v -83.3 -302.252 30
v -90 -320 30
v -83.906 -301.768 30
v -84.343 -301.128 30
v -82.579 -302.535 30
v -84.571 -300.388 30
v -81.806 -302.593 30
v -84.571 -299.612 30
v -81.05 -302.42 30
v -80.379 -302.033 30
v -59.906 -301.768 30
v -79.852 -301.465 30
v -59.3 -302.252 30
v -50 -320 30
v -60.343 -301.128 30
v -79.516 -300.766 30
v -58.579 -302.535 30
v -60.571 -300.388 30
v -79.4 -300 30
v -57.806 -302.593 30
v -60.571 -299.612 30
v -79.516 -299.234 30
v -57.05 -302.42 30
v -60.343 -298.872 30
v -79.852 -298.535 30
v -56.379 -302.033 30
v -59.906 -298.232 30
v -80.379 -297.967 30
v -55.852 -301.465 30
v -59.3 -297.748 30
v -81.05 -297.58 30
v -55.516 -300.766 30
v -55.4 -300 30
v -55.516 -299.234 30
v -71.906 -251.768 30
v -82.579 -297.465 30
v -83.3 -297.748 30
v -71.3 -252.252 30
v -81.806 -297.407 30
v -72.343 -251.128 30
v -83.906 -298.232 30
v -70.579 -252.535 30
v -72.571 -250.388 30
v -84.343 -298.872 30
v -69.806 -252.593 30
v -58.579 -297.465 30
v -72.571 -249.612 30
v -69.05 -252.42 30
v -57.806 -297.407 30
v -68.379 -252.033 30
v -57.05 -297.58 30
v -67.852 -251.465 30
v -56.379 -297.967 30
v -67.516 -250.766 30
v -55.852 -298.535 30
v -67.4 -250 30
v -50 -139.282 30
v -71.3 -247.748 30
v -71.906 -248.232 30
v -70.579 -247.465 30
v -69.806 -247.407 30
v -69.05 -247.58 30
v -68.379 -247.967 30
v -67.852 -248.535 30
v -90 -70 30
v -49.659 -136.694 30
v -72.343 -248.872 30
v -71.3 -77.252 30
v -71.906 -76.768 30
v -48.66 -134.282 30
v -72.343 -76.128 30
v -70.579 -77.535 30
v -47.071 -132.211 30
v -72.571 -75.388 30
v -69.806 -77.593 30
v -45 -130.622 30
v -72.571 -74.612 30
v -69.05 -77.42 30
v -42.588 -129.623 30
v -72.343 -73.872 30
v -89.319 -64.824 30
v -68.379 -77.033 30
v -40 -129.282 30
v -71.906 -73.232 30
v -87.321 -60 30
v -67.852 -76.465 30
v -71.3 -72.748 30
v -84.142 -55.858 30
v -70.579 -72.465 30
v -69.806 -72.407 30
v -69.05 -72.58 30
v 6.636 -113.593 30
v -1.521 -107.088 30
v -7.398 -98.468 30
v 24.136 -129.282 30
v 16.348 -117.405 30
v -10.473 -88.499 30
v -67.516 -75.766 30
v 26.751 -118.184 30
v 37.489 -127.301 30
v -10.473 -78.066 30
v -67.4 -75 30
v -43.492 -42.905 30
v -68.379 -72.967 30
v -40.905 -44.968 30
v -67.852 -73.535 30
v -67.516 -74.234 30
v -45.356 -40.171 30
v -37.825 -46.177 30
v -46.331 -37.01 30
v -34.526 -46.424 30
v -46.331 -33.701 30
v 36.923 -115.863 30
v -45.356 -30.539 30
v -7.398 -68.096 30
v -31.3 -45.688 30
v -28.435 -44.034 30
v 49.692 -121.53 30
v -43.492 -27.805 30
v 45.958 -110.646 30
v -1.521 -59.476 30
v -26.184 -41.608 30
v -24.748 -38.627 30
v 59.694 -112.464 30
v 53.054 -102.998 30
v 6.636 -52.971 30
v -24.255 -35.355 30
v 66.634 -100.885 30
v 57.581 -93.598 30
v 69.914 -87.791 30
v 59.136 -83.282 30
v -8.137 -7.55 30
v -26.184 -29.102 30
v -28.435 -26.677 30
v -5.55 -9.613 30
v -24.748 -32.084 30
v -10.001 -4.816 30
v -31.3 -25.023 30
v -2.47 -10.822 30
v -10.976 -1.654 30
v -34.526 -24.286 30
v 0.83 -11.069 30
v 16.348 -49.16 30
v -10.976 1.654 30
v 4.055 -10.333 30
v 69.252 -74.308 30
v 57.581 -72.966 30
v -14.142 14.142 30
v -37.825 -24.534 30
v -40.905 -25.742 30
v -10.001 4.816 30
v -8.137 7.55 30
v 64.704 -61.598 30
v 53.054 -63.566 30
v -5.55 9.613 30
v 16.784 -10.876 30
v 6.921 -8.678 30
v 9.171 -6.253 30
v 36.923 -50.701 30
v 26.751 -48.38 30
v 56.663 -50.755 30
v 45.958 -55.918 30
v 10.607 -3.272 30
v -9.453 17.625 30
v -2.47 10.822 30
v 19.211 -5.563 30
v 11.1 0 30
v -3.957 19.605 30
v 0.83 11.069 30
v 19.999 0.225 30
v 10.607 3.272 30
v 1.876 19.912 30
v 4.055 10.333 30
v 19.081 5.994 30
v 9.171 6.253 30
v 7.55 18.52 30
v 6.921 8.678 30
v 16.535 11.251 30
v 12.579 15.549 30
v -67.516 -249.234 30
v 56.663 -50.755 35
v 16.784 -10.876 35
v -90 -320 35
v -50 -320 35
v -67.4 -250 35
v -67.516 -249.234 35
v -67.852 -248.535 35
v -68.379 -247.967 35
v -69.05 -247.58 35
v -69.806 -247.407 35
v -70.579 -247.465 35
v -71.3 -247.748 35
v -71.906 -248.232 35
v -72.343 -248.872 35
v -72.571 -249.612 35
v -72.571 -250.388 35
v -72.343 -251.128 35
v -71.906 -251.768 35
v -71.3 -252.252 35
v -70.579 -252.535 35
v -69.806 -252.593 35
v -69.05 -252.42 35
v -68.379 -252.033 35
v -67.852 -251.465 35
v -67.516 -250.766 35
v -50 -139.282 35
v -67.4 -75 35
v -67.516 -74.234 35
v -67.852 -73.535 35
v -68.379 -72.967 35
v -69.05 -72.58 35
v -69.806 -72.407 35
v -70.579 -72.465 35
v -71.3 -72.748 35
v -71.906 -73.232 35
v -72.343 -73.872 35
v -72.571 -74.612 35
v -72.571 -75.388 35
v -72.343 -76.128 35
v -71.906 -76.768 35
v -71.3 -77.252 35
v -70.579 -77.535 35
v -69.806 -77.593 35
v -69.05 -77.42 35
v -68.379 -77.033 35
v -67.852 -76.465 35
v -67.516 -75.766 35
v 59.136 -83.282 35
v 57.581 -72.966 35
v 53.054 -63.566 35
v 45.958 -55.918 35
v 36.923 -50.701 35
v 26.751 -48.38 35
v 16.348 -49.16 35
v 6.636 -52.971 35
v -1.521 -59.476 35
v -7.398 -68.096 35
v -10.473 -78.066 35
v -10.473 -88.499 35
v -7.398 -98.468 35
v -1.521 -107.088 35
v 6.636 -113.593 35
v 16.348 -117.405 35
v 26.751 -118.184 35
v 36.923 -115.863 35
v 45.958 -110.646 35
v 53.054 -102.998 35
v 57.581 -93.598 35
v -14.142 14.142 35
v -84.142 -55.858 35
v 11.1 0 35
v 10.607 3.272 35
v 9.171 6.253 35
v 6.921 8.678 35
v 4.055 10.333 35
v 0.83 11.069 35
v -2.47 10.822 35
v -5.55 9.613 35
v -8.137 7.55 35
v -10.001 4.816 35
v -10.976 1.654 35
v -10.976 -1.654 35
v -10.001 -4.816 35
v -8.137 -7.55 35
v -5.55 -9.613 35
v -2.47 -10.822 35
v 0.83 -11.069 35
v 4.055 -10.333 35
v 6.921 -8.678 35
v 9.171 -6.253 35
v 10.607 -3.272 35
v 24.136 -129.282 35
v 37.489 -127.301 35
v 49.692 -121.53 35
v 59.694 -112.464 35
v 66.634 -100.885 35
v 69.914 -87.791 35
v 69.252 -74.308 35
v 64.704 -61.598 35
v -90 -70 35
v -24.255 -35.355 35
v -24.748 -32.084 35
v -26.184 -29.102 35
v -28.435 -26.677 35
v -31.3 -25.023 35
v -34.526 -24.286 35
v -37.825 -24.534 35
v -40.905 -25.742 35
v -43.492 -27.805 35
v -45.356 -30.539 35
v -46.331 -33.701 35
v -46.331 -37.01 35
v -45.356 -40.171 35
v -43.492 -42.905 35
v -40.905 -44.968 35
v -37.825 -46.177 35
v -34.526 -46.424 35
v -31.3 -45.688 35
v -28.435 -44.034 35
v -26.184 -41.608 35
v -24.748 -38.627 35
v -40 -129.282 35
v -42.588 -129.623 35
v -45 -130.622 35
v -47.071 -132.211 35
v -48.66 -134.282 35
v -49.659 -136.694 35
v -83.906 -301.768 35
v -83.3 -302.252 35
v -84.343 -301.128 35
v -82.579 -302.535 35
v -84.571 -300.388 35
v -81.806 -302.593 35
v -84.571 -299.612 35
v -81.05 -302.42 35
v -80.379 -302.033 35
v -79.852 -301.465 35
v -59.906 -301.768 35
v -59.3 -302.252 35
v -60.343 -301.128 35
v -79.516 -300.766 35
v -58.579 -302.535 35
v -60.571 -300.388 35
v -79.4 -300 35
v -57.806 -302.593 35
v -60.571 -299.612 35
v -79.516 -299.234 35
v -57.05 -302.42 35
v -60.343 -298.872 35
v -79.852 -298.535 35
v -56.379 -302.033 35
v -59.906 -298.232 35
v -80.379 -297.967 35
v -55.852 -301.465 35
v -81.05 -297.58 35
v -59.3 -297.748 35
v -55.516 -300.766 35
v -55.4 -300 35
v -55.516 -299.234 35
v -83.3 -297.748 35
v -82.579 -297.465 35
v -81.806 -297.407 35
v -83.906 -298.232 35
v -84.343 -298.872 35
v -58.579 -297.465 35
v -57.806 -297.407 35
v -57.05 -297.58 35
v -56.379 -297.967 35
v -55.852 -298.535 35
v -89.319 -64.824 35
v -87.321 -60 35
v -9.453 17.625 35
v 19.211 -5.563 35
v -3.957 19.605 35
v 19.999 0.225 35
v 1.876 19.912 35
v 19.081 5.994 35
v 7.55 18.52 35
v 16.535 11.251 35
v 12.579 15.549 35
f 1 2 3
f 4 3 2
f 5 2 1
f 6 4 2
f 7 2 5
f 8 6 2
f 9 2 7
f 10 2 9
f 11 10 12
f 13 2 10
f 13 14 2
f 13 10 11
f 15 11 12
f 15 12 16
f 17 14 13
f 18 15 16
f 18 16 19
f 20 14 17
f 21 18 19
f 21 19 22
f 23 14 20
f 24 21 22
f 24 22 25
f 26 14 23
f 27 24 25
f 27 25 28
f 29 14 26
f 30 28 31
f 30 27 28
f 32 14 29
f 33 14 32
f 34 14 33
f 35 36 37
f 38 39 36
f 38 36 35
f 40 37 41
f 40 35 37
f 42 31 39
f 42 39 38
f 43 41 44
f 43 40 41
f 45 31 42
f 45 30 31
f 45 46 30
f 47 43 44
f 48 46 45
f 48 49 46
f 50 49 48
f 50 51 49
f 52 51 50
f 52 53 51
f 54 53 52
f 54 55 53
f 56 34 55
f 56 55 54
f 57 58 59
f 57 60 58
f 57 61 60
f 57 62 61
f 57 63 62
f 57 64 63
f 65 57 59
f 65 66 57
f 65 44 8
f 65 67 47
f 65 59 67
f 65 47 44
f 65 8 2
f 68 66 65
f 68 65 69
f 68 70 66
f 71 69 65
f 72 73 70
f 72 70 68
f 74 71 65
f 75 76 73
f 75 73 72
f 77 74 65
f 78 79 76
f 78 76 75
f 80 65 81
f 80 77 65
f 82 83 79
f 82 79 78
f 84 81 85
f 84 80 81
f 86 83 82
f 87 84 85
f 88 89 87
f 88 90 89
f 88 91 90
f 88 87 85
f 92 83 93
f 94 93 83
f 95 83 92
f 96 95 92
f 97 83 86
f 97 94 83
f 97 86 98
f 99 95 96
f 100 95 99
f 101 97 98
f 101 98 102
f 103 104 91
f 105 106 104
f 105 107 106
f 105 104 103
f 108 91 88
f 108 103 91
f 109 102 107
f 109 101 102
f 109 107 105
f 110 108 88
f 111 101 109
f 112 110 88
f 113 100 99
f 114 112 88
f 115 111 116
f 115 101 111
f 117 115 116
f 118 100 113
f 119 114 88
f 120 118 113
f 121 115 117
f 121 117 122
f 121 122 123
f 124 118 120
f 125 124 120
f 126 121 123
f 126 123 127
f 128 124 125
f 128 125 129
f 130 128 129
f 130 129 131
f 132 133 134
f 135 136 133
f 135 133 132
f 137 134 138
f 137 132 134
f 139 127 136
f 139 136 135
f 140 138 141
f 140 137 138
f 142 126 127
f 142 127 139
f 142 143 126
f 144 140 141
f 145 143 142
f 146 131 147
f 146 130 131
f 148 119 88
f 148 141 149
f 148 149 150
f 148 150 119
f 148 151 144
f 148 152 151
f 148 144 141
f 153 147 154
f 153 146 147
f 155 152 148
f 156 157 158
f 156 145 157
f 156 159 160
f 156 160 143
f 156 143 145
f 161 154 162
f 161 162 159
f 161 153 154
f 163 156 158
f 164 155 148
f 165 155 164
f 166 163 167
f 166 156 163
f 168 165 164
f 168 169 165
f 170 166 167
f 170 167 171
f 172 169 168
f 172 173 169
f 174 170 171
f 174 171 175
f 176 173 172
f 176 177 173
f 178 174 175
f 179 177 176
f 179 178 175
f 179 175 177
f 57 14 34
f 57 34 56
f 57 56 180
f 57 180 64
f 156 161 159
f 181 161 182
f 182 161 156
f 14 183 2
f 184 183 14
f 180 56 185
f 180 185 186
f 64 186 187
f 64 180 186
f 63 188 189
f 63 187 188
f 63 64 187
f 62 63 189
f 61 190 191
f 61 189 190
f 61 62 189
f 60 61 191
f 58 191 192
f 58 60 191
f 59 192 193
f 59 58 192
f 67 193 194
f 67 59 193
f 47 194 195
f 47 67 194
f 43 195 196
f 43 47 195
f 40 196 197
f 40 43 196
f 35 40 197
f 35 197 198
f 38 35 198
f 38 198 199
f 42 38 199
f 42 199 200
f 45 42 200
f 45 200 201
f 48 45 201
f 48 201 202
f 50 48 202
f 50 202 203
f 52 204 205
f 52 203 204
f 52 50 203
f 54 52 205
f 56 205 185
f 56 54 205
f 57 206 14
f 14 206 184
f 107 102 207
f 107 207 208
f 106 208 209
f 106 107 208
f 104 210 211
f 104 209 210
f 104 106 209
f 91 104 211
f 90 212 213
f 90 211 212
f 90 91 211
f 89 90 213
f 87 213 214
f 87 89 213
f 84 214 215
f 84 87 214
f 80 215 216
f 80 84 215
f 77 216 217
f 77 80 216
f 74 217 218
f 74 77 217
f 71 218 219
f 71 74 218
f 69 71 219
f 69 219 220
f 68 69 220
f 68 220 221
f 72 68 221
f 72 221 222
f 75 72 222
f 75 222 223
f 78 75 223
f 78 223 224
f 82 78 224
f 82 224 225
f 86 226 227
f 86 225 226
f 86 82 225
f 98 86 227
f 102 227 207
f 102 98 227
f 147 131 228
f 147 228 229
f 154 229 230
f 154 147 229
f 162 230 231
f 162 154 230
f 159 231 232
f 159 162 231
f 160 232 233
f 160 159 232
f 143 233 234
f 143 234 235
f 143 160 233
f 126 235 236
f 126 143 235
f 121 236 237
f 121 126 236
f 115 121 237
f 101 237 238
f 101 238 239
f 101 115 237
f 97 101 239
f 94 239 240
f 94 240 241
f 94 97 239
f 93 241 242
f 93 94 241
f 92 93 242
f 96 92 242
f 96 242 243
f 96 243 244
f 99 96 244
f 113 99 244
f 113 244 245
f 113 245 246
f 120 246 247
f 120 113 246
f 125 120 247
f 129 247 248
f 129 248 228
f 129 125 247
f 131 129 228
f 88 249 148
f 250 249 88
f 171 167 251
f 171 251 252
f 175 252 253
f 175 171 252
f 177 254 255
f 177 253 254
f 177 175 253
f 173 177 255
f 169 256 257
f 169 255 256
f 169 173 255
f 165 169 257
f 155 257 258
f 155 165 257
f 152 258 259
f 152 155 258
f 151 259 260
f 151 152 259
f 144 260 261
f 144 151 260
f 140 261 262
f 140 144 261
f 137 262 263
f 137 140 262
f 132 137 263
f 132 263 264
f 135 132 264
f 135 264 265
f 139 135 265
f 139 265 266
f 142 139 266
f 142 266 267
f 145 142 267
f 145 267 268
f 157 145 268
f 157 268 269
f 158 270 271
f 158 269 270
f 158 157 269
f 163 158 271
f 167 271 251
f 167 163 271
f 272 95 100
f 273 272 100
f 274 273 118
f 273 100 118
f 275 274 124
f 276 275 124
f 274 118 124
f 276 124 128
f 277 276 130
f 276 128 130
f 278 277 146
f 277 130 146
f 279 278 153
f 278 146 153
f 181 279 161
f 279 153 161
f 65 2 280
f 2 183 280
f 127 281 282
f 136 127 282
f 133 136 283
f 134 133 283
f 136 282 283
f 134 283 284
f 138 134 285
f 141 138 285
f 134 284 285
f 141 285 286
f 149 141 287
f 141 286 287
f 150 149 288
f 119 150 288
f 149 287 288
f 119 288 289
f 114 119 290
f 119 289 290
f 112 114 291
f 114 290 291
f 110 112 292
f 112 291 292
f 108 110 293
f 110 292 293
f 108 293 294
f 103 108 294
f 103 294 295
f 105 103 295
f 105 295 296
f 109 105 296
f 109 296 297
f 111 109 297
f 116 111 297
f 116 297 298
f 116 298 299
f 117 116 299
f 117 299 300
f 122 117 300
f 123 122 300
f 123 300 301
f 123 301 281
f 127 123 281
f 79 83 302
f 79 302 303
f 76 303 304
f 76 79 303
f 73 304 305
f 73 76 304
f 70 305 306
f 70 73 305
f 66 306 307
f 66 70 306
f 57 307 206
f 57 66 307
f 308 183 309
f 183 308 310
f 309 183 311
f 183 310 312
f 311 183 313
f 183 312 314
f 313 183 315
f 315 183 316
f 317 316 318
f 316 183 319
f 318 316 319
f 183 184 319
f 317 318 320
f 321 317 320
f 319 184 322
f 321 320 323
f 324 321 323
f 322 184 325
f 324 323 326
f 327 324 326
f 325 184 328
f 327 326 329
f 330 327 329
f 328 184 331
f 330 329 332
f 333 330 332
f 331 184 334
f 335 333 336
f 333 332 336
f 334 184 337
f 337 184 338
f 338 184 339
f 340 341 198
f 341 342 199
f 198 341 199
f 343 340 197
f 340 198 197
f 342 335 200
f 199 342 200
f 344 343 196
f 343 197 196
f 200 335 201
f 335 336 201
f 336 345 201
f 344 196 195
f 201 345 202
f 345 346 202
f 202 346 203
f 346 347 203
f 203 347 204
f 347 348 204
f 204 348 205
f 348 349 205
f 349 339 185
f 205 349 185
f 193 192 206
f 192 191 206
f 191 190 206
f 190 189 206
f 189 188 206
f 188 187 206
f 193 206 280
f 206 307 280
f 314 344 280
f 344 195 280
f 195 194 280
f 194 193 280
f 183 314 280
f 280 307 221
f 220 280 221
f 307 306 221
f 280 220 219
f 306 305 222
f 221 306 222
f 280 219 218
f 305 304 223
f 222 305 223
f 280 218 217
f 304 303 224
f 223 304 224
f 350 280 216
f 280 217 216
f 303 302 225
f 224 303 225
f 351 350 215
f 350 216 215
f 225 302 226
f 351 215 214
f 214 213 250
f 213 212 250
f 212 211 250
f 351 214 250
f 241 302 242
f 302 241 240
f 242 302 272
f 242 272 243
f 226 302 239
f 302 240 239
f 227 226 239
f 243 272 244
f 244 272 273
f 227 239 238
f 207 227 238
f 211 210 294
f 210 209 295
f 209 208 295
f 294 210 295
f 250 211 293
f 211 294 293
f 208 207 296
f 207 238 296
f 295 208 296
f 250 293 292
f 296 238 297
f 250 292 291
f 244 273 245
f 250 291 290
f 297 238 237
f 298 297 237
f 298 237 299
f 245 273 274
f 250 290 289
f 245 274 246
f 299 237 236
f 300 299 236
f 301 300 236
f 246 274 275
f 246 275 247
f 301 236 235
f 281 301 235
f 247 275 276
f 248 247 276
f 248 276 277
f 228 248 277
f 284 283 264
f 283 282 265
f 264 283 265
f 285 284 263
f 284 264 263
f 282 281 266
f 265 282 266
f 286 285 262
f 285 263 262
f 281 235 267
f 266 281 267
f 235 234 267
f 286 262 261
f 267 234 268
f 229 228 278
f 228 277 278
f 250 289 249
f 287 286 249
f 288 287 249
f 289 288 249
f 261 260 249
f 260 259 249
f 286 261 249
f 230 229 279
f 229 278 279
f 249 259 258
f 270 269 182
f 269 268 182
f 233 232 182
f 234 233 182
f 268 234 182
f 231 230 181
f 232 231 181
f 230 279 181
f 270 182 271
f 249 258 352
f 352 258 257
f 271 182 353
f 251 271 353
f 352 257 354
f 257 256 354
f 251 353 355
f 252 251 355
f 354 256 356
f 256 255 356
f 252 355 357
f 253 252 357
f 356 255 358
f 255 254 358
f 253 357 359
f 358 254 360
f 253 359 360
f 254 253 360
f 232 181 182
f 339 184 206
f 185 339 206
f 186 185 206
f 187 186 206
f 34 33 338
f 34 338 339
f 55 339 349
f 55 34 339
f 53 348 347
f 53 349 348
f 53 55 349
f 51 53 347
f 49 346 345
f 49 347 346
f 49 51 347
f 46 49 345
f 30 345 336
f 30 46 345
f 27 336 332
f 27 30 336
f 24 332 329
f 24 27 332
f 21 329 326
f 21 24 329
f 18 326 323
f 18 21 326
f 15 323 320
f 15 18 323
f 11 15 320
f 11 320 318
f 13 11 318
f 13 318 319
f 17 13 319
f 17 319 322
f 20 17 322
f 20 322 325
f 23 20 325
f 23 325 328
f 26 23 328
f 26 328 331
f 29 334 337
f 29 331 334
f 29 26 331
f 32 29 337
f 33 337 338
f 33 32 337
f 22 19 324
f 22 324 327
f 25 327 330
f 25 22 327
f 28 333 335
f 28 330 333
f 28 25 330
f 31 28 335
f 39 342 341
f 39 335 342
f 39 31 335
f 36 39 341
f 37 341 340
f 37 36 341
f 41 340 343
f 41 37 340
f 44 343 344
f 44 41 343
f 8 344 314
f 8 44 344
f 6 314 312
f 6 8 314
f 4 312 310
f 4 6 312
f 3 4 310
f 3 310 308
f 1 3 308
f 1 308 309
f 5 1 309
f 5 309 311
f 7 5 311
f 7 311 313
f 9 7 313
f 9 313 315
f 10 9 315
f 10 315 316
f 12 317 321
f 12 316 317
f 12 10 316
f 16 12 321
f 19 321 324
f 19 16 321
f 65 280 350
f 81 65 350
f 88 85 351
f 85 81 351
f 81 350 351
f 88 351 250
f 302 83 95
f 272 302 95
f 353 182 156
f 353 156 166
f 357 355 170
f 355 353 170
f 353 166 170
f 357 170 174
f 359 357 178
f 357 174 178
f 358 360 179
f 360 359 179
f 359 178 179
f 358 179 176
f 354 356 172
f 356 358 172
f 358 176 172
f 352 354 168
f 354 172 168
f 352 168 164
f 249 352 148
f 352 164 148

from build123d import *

# Parameters (mm, degrees)
SKETCH_1_R                = 20
SKETCH_1_R_2              = 11.1
EXTRUDE_1_DEPTH           = 60
EXTRUDE_2_DEPTH           = 30
SKETCH_4_R                = 11
EXTRUDE_3_DEPTH           = 5
SKETCH_8_R                = 11.1
CUT_EXTRUDE_1_DEPTH       = 100
FILLET_4_R                = 20
EXTRUDE_START             = -30
SKETCH_18_R               = 35
EXTRUDE_4_DEPTH           = 5
EXTRUDE_START_2           = -25
SKETCH_19_R               = 35
EXTRUDE_5_DEPTH           = 5
FILLET_5_R                = 10
CUT_EXTRUDE_9_DEPTH       = 388.169213652
CUT_EXTRUDE_9_DEPTH_BACK  = 388.169213652
SKETCH_21_R               = 2.6
CUT_EXTRUDE_10_DEPTH      = 409.372938359
CUT_EXTRUDE_10_DEPTH_BACK = 409.372938359
SKETCH_22_W               = 35
SKETCH_22_H               = 453.381241258
SKETCH_22_W_2             = 30
SKETCH_22_H_2             = 431.087956996


with BuildPart() as part:
    # 草图1 → 凸台-拉伸1 (new body)
    with BuildSketch(Plane.XY):
        Circle(SKETCH_1_R)
        Circle(SKETCH_1_R_2, mode=Mode.SUBTRACT)
    extrude(amount=EXTRUDE_1_DEPTH)

    # 草图2 → 凸台-拉伸2 (add, symmetric)
    with BuildSketch(Plane.XY.offset(30)):
        with BuildLine():
            Line((-14.142135624, 14.142135624), (-90, -61.715728753))
            Line((-90, -61.715728753), (-90, -320))
            Line((-90, -320), (-50, -320))
            Line((-50, -320), (-50, -78.284271247))
            Line((-50, -78.284271247), (14.142135624, -14.142135624))
            ThreePointArc((14.142135624, -14.142135624), (-14.142135624, -14.142135624), (-14.142135624, 14.142135624))
        make_face()
    extrude(amount=EXTRUDE_2_DEPTH, both=True)

    # 草图4 → 凸台-拉伸3 (add)
    with BuildSketch(Plane.XY.offset(60)):
        with BuildLine():
            Line((-90, -290), (-50, -290))
            Line((-50, -290), (-50, -350))
            ThreePointArc((-50, -350), (-70, -370), (-90, -350))
            Line((-90, -350), (-90, -290))
        make_face()
        with Locations((-70, -350)):
            Circle(SKETCH_4_R, mode=Mode.SUBTRACT)
    extrude_3 = extrude(amount=EXTRUDE_3_DEPTH)

    # 镜向1: 凸台-拉伸3 across plane
    add(extrude_3.mirror(Plane.XY.offset(30)))

    # 草图8 → 切除-拉伸1 (cut)
    with BuildSketch(Plane.XY.offset(60)):
        with Locations((-35.355339059, -35.355339059)):
            Circle(SKETCH_8_R)
    extrude(amount=-CUT_EXTRUDE_1_DEPTH, mode=Mode.SUBTRACT)

    # 圆角4
    fillet_4_edges = [part.edges().sort_by_distance(p)[0] for p in [
        (-50, -78.284271247, 30),
        (-90, -61.715728753, 30),
    ]]
    fillet(fillet_4_edges, radius=FILLET_4_R)

    # 草图18 → 凸台-拉伸4 (add)
    with BuildSketch(Plane.XY.offset(60).offset(EXTRUDE_START)):
        with BuildLine():
            ThreePointArc((16.783988507, -10.876475983), (15.54903282, -12.578854413), (14.142135624, -14.142135624))
            Line((14.142135624, -14.142135624), (-44.142135624, -72.426406871))
            ThreePointArc((-44.142135624, -72.426406871), (-48.47759065, -78.914873848), (-50, -86.568542495))
            Line((-50, -86.568542495), (-50, -129.282056212))
            Line((-50, -129.282056212), (24.135744866, -129.282056212))
            ThreePointArc((24.135744866, -129.282056212), (66.634203362, -100.885494101), (56.662656801, -50.755144277))
            Line((56.662656801, -50.755144277), (16.783988507, -10.876475983))
        make_face()
        with Locations((24.135744866, -83.282056212)):
            Circle(SKETCH_18_R, mode=Mode.SUBTRACT)
    extrude(amount=EXTRUDE_4_DEPTH)

    # 草图19 → 凸台-拉伸5 (add)
    with BuildSketch(Plane(origin=(0, 0, 0), x_dir=(-1, 0, 0), z_dir=(0, 0, -1)).offset(EXTRUDE_START_2)):
        with BuildLine():
            Line((50, -135.340123781), (50, -227.340123781))
            Line((50, -227.340123781), (-4.524131353, -227.340123781))
            ThreePointArc((-4.524131353, -227.340123781), (-50.524131353, -181.340123781), (-4.524131353, -135.340123781))
            Line((-4.524131353, -135.340123781), (50, -135.340123781))
        make_face()
        with Locations((-4.524131353, -181.340123781)):
            Circle(SKETCH_19_R, mode=Mode.SUBTRACT)
    extrude(amount=-EXTRUDE_5_DEPTH)

    # 圆角5
    # the kernel refuses this fillet: 10 mm, written as the material it adds along each edge
    with BuildSketch(Plane(origin=(-50, -227.340123781, 25), x_dir=(0, -1, 0), z_dir=(0, 0, 1)), Plane(origin=(-50, -129.282056212, 30), x_dir=(0, -1, 0), z_dir=(0, 0, 1))) as fillet_5_piece_1:
        with BuildLine():
            CenterArc((FILLET_5_R, FILLET_5_R), FILLET_5_R, 180, 90)
            Line((0, FILLET_5_R), (0, 0))
            Line((0, 0), (FILLET_5_R, 0))
        make_face()
    extrude(amount=5)

    # 草图21 → 切除-拉伸9 (cut, two sides: drawn at the far end of the back side and taken through both)
    with BuildSketch(Plane.XY.offset(65).offset(-CUT_EXTRUDE_9_DEPTH_BACK)):
        with Locations((-70, -75)):
            Circle(SKETCH_21_R)
        with Locations((-70, -250)):
            Circle(SKETCH_21_R)
        with Locations((-58, -300)):
            Circle(SKETCH_21_R)
        with Locations((-82, -300)):
            Circle(SKETCH_21_R)
    extrude(amount=CUT_EXTRUDE_9_DEPTH + CUT_EXTRUDE_9_DEPTH_BACK, mode=Mode.SUBTRACT)

    # 草图22 → 切除-拉伸10 (cut, two sides: drawn at the far end of the back side and taken through both)
    with BuildSketch(Plane.ZY.offset(90).offset(-CUT_EXTRUDE_10_DEPTH_BACK)):
        with Locations((12.5, -161.772701044)):
            Rectangle(SKETCH_22_W, SKETCH_22_H)
        with Locations((50, -154.456021502)):
            Rectangle(SKETCH_22_W_2, SKETCH_22_H_2)
    extrude(amount=CUT_EXTRUDE_10_DEPTH + CUT_EXTRUDE_10_DEPTH_BACK, mode=Mode.SUBTRACT)


solid = part.part
